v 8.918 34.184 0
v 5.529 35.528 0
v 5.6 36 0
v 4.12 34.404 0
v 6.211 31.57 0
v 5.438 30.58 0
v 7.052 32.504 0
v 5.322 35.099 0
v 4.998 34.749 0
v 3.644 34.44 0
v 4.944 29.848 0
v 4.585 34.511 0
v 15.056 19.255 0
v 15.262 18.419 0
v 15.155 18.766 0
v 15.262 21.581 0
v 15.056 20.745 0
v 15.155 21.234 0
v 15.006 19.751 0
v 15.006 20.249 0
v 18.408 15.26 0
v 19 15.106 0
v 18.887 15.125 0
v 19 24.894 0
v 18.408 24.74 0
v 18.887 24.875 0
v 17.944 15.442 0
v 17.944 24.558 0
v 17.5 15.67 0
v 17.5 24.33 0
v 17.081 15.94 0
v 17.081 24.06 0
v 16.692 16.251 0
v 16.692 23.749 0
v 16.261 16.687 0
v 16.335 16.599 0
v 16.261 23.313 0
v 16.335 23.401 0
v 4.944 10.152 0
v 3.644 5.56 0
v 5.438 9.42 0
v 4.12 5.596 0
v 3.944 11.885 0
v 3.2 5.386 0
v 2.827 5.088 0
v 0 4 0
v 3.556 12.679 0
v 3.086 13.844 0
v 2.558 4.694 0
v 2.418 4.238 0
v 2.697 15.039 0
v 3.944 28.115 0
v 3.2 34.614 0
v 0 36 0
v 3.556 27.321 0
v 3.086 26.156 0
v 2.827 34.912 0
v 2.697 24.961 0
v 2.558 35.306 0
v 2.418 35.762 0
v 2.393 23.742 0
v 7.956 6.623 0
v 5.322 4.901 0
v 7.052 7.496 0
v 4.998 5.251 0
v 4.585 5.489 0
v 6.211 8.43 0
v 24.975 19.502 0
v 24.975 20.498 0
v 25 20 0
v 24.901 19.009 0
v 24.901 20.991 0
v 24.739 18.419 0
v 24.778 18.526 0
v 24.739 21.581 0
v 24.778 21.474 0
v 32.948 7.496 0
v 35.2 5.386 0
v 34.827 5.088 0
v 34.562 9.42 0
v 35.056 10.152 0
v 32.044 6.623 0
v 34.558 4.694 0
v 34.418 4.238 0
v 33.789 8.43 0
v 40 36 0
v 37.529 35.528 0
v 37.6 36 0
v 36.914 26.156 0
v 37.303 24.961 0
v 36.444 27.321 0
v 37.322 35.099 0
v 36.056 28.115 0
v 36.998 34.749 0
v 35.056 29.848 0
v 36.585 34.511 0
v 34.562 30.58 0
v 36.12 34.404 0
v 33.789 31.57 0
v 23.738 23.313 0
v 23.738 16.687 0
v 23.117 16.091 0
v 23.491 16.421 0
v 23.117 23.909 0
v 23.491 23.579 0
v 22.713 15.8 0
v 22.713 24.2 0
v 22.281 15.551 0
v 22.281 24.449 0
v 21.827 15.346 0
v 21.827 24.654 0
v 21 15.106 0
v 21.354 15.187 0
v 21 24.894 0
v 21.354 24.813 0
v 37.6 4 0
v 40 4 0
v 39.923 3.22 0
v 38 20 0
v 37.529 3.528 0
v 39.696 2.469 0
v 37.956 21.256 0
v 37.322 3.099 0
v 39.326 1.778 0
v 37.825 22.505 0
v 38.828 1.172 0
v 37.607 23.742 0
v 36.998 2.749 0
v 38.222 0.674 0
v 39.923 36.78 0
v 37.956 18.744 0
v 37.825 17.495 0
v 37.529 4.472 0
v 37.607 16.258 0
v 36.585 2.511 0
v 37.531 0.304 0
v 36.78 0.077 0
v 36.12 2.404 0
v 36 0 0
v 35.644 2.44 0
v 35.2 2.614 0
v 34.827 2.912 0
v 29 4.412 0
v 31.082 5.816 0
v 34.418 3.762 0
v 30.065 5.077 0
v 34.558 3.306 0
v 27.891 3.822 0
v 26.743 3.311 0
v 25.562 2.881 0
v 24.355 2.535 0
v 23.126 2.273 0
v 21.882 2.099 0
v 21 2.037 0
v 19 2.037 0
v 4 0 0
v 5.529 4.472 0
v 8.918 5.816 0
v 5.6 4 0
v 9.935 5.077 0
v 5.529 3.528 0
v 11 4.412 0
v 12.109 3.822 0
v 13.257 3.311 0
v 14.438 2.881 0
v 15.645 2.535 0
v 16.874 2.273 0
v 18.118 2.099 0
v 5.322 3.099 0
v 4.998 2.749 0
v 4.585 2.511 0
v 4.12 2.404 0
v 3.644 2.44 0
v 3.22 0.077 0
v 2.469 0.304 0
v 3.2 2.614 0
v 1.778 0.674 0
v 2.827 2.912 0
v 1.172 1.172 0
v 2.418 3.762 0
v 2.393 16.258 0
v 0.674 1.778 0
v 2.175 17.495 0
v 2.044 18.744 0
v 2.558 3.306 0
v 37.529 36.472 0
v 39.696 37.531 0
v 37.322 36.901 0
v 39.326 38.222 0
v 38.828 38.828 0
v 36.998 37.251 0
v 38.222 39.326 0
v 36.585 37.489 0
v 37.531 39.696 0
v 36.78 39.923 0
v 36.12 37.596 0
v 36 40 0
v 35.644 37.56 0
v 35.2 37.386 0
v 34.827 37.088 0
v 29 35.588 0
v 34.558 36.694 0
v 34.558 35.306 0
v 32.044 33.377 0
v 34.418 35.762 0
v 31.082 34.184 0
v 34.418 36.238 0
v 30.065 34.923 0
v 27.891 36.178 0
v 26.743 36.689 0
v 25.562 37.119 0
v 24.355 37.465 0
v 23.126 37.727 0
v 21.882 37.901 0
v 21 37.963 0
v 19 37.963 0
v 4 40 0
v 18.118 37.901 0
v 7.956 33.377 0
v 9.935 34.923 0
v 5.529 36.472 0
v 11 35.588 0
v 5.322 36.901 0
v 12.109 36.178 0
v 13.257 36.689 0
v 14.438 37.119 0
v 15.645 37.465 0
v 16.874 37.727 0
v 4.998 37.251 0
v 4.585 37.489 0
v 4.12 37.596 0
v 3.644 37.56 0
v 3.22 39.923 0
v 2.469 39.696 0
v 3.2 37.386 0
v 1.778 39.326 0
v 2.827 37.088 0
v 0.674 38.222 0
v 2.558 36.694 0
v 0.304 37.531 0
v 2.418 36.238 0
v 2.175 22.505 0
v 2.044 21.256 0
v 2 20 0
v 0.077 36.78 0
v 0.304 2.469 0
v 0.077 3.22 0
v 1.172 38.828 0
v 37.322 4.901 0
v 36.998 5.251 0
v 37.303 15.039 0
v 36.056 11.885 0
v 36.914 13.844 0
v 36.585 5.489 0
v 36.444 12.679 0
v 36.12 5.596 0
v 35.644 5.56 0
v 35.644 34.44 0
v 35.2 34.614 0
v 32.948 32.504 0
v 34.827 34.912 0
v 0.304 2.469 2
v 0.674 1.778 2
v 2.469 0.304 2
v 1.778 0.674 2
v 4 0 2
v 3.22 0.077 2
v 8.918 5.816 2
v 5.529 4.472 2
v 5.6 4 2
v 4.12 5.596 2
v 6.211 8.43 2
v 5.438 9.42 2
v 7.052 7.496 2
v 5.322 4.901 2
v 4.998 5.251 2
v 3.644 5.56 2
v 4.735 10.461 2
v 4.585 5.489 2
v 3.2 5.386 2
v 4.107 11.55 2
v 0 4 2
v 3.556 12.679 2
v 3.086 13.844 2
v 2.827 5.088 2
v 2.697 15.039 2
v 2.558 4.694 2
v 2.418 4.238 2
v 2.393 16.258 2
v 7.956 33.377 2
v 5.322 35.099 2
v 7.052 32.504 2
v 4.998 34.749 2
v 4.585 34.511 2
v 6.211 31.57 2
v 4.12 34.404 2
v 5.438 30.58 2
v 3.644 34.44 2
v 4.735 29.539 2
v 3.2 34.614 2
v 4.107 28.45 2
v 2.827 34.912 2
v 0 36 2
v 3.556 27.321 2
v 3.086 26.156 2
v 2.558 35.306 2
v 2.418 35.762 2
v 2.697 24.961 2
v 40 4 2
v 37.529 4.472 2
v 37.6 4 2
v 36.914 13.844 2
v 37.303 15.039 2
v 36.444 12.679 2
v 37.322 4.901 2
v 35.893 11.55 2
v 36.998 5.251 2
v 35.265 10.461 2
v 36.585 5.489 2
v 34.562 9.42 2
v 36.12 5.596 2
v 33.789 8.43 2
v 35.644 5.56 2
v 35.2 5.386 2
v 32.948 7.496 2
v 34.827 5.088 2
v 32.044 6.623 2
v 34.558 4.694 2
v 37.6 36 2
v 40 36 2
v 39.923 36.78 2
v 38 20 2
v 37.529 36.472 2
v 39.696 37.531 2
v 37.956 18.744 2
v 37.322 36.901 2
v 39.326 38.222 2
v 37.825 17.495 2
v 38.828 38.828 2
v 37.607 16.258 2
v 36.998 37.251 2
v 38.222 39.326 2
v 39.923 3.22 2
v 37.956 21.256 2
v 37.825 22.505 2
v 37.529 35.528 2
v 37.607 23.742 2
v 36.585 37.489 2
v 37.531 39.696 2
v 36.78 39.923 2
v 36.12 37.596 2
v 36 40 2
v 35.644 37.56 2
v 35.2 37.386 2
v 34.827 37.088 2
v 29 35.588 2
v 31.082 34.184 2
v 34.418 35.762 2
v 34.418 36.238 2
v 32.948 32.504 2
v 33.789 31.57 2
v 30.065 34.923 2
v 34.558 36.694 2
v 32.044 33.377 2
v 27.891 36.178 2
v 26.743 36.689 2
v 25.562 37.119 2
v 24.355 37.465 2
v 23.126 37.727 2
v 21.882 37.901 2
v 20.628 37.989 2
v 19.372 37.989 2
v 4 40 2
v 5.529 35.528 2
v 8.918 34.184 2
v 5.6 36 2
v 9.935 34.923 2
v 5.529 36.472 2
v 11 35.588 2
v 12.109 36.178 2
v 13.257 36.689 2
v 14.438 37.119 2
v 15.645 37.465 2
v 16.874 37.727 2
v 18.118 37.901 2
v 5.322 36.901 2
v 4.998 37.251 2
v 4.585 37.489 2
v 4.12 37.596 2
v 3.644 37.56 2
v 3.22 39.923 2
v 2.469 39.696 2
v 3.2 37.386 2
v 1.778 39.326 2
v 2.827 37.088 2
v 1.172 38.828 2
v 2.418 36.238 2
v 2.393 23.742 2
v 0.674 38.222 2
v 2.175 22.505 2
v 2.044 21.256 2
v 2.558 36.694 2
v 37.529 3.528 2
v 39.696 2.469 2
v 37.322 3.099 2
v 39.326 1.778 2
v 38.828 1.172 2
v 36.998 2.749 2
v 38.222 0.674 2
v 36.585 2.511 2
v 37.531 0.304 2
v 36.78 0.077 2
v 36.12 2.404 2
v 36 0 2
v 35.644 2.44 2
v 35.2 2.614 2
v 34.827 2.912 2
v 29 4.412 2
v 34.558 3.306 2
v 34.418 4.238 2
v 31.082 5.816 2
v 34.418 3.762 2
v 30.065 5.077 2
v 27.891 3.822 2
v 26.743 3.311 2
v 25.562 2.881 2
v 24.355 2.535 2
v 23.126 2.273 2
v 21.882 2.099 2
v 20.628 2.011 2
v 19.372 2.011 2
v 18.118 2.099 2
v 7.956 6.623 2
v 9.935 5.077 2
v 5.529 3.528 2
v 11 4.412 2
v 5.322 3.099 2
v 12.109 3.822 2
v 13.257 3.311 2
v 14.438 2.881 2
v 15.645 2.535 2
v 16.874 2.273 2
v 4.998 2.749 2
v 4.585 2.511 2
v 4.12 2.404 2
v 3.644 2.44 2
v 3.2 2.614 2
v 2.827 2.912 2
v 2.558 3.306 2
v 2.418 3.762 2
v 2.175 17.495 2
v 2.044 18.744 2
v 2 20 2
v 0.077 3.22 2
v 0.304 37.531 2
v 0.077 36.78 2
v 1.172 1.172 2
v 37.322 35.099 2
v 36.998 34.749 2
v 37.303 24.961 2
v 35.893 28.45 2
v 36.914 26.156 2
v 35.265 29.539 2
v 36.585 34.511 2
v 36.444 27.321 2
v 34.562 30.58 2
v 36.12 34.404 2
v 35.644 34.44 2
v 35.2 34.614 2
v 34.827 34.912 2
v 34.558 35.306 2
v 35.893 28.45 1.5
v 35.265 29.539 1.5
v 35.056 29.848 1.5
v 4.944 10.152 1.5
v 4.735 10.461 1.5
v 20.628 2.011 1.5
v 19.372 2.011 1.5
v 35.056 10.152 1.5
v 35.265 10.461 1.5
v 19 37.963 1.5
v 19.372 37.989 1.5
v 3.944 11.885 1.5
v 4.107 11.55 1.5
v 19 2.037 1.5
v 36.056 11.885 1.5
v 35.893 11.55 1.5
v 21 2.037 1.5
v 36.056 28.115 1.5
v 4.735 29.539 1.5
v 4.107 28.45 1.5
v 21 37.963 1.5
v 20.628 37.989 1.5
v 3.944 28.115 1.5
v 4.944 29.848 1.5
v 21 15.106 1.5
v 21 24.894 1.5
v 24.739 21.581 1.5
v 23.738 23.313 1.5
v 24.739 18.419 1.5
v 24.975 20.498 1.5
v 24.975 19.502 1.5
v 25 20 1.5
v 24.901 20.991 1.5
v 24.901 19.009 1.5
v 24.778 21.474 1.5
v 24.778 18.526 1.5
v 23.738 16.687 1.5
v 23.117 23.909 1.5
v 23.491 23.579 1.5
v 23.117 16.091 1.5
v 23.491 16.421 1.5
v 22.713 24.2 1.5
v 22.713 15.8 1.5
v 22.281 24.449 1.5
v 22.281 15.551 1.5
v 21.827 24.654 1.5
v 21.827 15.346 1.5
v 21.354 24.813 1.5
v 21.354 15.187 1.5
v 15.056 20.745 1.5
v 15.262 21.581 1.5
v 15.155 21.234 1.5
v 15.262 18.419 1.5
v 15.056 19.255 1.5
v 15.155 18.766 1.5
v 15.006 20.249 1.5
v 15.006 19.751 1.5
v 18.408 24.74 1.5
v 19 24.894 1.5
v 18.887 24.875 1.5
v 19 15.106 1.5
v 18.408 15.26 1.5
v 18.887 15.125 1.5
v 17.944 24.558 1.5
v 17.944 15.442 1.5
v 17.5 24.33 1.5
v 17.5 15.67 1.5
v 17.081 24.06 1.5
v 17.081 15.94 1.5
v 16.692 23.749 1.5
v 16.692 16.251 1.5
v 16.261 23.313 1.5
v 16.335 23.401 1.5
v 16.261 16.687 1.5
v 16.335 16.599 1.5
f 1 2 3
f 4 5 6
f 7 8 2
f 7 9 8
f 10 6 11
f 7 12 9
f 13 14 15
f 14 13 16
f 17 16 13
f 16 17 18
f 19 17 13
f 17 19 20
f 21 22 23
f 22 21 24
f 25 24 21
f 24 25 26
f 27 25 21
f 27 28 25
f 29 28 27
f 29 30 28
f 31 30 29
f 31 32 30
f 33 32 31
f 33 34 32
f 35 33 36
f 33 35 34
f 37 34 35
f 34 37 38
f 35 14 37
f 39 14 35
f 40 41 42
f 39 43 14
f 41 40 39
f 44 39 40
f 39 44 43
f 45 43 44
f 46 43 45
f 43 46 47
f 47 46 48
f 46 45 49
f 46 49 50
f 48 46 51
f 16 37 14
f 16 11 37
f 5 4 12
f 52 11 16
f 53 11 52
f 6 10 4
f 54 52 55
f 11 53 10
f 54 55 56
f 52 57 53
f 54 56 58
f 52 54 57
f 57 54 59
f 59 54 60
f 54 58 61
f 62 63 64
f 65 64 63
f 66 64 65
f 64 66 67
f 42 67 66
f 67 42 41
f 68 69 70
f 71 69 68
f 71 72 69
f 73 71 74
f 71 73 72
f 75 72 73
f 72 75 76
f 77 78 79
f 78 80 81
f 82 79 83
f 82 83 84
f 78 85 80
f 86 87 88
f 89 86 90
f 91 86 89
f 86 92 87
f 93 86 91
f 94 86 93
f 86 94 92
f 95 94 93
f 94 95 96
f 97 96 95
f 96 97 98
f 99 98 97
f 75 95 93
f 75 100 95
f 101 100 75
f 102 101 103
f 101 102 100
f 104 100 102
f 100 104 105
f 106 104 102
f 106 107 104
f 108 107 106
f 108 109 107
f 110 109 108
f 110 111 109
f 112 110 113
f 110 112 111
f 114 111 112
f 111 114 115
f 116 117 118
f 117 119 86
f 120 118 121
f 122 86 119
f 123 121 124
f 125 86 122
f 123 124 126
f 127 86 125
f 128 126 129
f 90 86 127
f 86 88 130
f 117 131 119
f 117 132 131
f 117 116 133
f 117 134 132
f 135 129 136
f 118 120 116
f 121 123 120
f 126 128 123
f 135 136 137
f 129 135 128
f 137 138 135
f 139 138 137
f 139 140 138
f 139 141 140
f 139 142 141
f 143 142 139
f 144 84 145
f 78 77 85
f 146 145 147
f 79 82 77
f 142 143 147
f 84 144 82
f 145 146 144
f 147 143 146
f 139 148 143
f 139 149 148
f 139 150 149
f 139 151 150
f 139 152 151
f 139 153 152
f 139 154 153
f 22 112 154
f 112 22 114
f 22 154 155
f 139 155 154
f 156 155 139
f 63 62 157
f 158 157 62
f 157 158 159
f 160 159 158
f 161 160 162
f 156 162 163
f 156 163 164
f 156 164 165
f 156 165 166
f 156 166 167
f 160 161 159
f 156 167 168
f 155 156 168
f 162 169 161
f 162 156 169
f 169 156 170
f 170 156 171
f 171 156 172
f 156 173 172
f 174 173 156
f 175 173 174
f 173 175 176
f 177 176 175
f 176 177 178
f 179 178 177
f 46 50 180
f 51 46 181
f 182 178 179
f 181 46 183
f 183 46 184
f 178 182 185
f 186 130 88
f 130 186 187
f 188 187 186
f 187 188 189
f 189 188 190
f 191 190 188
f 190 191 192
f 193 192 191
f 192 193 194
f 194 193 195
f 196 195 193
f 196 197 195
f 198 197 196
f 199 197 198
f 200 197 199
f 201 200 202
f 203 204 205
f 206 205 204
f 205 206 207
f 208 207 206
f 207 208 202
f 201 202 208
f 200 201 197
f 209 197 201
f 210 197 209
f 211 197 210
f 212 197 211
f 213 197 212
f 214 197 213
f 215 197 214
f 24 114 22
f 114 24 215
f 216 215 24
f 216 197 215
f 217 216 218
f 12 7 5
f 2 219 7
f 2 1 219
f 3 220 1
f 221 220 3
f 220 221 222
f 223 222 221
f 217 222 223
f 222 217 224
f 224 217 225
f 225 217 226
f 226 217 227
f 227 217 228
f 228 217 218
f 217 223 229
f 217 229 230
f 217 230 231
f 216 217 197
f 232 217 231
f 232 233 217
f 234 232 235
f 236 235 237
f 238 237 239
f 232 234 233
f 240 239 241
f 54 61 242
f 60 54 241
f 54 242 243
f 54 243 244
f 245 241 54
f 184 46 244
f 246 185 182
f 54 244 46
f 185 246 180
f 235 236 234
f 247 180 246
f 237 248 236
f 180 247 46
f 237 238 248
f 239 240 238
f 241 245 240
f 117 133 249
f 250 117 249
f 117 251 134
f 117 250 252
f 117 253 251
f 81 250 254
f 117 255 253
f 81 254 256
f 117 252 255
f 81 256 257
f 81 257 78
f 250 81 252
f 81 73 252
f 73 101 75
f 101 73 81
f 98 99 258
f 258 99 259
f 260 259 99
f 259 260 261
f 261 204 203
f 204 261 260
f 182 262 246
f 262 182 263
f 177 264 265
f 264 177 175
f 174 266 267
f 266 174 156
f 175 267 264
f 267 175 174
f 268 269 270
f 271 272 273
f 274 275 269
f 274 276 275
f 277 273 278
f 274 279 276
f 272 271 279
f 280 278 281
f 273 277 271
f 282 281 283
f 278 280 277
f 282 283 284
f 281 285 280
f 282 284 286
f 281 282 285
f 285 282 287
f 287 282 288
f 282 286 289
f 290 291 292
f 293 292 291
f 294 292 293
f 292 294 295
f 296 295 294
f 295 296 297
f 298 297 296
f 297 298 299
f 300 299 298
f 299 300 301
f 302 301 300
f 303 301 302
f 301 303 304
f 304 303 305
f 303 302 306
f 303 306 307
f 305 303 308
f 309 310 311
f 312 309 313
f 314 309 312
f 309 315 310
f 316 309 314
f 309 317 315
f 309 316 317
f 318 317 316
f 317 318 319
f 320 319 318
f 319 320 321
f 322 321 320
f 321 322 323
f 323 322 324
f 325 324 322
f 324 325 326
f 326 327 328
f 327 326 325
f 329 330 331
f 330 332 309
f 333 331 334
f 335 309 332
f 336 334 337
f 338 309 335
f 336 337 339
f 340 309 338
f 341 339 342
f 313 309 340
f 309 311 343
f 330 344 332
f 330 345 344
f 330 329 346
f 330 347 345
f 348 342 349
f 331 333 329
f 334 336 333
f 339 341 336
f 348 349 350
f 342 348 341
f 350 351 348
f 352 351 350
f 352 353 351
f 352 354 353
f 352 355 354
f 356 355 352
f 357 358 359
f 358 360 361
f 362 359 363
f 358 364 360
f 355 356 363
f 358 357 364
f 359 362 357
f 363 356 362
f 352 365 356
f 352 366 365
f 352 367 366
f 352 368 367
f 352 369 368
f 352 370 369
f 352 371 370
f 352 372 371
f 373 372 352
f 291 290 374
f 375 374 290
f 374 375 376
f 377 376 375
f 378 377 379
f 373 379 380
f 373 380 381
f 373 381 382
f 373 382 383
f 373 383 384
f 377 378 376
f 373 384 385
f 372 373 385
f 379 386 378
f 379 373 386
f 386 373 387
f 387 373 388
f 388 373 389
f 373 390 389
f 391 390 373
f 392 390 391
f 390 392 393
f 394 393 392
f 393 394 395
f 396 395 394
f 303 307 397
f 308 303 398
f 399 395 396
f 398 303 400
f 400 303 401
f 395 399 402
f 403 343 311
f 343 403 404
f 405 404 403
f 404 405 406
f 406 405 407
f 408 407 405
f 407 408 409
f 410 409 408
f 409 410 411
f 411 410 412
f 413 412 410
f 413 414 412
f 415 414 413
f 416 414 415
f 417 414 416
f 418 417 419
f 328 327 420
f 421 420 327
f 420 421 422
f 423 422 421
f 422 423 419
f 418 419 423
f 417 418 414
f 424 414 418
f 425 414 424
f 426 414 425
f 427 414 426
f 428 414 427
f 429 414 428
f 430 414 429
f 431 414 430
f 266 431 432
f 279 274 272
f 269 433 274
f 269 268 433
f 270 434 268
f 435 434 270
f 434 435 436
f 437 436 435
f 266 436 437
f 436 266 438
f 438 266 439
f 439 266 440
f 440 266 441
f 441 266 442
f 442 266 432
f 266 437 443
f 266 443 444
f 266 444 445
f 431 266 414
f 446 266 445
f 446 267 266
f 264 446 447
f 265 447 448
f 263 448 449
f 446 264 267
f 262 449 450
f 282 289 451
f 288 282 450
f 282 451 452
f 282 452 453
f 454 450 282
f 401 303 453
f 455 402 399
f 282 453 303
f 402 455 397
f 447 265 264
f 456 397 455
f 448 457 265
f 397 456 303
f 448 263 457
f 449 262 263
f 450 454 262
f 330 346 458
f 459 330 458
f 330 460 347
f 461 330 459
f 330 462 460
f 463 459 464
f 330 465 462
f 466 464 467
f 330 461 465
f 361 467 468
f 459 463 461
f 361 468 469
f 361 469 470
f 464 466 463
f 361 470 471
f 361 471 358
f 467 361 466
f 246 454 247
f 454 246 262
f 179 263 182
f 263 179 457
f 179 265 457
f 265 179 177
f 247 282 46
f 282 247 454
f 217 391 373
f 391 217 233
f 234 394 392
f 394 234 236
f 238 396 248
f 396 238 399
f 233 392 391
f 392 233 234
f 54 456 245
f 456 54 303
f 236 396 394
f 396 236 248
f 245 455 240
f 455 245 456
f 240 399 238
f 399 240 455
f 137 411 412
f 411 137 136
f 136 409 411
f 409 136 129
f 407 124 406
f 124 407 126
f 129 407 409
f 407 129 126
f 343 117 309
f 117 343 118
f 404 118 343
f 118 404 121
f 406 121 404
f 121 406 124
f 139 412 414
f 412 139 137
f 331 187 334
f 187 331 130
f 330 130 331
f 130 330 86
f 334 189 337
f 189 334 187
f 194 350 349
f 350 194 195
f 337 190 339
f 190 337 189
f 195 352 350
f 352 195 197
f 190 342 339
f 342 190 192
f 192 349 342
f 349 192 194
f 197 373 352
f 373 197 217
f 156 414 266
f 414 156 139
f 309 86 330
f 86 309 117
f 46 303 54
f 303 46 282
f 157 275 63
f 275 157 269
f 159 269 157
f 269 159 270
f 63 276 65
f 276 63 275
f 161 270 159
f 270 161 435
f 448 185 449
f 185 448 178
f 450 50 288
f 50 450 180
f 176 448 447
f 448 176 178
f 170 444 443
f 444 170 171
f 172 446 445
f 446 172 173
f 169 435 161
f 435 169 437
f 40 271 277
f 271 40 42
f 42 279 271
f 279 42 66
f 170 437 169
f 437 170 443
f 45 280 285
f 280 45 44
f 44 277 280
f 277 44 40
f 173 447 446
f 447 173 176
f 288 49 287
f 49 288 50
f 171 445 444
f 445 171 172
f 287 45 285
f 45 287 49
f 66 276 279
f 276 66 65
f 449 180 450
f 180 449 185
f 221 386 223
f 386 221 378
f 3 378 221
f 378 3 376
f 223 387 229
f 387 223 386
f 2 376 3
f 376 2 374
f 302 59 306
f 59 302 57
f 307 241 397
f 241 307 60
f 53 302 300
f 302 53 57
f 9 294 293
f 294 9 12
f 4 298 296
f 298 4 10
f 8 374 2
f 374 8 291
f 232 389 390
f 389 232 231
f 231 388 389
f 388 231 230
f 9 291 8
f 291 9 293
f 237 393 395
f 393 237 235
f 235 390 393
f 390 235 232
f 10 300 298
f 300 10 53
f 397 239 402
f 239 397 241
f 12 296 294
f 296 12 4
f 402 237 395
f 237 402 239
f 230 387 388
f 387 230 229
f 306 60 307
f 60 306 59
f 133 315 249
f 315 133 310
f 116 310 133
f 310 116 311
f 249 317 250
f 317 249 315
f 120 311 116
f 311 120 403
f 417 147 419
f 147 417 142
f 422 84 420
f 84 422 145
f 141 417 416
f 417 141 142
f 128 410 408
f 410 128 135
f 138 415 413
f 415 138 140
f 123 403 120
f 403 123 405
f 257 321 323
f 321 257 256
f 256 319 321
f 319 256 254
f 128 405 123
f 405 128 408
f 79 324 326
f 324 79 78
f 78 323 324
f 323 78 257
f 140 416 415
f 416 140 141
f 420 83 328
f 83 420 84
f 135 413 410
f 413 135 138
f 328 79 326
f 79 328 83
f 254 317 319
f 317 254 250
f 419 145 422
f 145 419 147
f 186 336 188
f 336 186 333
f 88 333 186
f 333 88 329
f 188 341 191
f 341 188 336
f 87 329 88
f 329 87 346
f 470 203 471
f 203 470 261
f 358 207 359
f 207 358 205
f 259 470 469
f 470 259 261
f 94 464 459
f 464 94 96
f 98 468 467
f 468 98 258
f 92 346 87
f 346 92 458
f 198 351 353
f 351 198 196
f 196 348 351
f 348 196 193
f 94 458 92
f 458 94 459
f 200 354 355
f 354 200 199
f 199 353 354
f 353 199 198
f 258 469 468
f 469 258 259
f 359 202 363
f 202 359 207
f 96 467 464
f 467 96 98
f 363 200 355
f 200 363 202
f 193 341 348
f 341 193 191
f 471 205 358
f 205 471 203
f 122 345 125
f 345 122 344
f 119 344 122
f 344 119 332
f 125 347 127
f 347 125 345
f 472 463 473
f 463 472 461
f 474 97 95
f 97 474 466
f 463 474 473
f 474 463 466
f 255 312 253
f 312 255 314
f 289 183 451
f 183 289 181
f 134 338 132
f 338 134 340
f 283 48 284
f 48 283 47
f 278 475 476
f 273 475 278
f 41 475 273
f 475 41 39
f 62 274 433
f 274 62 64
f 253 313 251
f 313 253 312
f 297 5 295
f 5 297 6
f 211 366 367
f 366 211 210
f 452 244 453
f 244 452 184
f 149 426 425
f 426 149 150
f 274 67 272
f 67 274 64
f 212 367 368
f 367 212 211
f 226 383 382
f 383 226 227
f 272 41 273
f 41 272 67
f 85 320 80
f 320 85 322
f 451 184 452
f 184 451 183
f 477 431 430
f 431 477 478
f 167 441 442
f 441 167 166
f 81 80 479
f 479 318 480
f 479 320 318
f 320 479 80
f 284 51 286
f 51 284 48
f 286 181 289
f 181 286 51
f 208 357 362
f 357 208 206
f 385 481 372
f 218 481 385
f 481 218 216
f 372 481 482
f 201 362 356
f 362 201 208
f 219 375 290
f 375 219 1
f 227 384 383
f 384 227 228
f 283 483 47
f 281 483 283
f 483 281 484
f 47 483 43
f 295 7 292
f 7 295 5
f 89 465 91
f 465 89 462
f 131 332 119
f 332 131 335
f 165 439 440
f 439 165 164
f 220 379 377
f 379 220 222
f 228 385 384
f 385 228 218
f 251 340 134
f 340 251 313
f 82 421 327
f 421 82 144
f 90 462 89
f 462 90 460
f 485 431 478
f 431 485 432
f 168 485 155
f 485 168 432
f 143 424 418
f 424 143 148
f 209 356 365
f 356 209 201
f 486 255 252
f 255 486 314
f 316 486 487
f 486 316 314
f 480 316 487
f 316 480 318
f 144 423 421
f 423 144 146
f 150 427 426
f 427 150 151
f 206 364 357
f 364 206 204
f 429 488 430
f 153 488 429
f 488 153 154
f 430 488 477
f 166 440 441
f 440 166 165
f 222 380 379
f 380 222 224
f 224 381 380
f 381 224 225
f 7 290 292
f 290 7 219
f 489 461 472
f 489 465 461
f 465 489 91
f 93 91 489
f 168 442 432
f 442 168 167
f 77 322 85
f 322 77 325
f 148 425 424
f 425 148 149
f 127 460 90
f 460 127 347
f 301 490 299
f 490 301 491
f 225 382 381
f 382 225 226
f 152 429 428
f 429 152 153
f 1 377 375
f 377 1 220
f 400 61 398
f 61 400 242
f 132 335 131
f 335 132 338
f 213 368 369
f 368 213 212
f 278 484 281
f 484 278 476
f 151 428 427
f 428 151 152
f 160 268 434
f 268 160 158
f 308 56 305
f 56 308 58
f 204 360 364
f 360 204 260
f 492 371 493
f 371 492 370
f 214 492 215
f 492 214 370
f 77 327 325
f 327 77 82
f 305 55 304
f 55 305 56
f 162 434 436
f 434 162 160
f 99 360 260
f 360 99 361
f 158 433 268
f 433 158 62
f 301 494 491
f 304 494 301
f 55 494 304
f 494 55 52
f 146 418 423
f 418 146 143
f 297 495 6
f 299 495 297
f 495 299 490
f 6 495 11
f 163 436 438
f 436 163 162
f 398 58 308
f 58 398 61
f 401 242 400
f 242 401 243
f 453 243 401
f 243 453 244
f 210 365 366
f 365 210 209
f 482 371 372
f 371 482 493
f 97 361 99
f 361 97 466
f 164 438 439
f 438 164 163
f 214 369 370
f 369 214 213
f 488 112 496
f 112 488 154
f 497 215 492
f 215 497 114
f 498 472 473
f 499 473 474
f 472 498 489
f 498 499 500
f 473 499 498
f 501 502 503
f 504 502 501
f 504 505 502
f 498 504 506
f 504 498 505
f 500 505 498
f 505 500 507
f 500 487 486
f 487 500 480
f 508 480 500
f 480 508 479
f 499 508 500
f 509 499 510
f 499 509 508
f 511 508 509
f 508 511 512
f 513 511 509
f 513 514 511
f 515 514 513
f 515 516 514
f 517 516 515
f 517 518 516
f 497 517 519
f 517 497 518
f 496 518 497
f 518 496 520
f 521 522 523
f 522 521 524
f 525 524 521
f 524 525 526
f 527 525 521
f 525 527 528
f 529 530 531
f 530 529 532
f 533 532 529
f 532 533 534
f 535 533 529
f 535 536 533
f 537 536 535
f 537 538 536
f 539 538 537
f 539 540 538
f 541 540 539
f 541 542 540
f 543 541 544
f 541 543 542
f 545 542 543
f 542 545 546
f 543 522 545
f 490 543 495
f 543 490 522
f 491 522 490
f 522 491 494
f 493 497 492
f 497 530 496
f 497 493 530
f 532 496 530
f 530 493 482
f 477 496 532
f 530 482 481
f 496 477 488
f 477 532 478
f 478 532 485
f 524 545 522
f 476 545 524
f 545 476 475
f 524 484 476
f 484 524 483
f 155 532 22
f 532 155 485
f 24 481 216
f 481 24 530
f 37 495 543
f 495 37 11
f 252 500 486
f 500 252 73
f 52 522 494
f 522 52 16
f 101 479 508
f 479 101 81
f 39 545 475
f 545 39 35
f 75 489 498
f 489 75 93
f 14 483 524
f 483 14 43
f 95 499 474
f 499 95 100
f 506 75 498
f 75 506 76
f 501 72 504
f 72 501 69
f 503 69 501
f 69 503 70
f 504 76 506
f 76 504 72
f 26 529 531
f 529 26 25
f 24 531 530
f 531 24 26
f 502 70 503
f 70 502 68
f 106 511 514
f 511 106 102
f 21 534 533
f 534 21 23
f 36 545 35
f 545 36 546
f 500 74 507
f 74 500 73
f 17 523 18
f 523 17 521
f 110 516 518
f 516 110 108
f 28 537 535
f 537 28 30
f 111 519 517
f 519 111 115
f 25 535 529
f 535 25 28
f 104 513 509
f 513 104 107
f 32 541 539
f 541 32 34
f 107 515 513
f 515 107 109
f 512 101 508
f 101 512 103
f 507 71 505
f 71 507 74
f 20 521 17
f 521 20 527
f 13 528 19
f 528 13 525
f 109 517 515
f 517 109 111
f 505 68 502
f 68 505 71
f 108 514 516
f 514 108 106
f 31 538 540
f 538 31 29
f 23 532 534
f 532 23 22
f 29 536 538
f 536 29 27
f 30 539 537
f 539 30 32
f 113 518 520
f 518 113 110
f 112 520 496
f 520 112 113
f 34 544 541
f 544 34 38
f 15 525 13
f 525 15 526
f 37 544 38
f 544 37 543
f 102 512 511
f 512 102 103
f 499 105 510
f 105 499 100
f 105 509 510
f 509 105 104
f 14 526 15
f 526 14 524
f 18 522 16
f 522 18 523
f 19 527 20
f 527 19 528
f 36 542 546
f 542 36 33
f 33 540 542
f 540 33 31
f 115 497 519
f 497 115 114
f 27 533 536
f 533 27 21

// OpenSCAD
// Size of the fan, in mm
fansize = 40;
// Offset of the screws from the edge of the fan
screwoffset = 4;
// Size of the screw holes
screwsize = 3;

// Modules imported from mlib.scad
module mroundcube(d, r = 1, center = false)
{
    trn = center ? [-d[0]/2, -d[1]/2, -d[2]/2] : [0,0,0];
    translate(trn) union() {
        for(i=[r,d[0]-r])
            for(j=[r,d[1]-r])
                translate([i, j, 0]) cylinder(r=r, h=d[2], $fn=32);
        translate([r, 0, 0]) cube([d[0] - 2 * r, d[1], d[2]]);
        translate([0, r, 0]) cube([d[0], d[1] - 2 * r, d[2]]);
    }
}

$fs = 0.5;
$fa = 4;

difference() {
    mroundcube([fansize, fansize, 2], screwoffset);
    screws=[screwoffset, fansize-screwoffset];
    for(x=screws) for(y=screws) {
        translate([x, y, -1]) cylinder(r=screwsize/2+0.1, h=10);
    }
    translate([fansize/2, fansize/2, -1]) cylinder(r=fansize/2-2, h=10);
}

translate([fansize/2, fansize/2, 0]) cylinder(r=fansize/8, h=1.5);

for(i=[0, 60, 120]) {
    translate([fansize/2, fansize/2, .75]) rotate([0, 0, i]) cube([fansize / 20, fansize-2, 1.5], center=true);
}
